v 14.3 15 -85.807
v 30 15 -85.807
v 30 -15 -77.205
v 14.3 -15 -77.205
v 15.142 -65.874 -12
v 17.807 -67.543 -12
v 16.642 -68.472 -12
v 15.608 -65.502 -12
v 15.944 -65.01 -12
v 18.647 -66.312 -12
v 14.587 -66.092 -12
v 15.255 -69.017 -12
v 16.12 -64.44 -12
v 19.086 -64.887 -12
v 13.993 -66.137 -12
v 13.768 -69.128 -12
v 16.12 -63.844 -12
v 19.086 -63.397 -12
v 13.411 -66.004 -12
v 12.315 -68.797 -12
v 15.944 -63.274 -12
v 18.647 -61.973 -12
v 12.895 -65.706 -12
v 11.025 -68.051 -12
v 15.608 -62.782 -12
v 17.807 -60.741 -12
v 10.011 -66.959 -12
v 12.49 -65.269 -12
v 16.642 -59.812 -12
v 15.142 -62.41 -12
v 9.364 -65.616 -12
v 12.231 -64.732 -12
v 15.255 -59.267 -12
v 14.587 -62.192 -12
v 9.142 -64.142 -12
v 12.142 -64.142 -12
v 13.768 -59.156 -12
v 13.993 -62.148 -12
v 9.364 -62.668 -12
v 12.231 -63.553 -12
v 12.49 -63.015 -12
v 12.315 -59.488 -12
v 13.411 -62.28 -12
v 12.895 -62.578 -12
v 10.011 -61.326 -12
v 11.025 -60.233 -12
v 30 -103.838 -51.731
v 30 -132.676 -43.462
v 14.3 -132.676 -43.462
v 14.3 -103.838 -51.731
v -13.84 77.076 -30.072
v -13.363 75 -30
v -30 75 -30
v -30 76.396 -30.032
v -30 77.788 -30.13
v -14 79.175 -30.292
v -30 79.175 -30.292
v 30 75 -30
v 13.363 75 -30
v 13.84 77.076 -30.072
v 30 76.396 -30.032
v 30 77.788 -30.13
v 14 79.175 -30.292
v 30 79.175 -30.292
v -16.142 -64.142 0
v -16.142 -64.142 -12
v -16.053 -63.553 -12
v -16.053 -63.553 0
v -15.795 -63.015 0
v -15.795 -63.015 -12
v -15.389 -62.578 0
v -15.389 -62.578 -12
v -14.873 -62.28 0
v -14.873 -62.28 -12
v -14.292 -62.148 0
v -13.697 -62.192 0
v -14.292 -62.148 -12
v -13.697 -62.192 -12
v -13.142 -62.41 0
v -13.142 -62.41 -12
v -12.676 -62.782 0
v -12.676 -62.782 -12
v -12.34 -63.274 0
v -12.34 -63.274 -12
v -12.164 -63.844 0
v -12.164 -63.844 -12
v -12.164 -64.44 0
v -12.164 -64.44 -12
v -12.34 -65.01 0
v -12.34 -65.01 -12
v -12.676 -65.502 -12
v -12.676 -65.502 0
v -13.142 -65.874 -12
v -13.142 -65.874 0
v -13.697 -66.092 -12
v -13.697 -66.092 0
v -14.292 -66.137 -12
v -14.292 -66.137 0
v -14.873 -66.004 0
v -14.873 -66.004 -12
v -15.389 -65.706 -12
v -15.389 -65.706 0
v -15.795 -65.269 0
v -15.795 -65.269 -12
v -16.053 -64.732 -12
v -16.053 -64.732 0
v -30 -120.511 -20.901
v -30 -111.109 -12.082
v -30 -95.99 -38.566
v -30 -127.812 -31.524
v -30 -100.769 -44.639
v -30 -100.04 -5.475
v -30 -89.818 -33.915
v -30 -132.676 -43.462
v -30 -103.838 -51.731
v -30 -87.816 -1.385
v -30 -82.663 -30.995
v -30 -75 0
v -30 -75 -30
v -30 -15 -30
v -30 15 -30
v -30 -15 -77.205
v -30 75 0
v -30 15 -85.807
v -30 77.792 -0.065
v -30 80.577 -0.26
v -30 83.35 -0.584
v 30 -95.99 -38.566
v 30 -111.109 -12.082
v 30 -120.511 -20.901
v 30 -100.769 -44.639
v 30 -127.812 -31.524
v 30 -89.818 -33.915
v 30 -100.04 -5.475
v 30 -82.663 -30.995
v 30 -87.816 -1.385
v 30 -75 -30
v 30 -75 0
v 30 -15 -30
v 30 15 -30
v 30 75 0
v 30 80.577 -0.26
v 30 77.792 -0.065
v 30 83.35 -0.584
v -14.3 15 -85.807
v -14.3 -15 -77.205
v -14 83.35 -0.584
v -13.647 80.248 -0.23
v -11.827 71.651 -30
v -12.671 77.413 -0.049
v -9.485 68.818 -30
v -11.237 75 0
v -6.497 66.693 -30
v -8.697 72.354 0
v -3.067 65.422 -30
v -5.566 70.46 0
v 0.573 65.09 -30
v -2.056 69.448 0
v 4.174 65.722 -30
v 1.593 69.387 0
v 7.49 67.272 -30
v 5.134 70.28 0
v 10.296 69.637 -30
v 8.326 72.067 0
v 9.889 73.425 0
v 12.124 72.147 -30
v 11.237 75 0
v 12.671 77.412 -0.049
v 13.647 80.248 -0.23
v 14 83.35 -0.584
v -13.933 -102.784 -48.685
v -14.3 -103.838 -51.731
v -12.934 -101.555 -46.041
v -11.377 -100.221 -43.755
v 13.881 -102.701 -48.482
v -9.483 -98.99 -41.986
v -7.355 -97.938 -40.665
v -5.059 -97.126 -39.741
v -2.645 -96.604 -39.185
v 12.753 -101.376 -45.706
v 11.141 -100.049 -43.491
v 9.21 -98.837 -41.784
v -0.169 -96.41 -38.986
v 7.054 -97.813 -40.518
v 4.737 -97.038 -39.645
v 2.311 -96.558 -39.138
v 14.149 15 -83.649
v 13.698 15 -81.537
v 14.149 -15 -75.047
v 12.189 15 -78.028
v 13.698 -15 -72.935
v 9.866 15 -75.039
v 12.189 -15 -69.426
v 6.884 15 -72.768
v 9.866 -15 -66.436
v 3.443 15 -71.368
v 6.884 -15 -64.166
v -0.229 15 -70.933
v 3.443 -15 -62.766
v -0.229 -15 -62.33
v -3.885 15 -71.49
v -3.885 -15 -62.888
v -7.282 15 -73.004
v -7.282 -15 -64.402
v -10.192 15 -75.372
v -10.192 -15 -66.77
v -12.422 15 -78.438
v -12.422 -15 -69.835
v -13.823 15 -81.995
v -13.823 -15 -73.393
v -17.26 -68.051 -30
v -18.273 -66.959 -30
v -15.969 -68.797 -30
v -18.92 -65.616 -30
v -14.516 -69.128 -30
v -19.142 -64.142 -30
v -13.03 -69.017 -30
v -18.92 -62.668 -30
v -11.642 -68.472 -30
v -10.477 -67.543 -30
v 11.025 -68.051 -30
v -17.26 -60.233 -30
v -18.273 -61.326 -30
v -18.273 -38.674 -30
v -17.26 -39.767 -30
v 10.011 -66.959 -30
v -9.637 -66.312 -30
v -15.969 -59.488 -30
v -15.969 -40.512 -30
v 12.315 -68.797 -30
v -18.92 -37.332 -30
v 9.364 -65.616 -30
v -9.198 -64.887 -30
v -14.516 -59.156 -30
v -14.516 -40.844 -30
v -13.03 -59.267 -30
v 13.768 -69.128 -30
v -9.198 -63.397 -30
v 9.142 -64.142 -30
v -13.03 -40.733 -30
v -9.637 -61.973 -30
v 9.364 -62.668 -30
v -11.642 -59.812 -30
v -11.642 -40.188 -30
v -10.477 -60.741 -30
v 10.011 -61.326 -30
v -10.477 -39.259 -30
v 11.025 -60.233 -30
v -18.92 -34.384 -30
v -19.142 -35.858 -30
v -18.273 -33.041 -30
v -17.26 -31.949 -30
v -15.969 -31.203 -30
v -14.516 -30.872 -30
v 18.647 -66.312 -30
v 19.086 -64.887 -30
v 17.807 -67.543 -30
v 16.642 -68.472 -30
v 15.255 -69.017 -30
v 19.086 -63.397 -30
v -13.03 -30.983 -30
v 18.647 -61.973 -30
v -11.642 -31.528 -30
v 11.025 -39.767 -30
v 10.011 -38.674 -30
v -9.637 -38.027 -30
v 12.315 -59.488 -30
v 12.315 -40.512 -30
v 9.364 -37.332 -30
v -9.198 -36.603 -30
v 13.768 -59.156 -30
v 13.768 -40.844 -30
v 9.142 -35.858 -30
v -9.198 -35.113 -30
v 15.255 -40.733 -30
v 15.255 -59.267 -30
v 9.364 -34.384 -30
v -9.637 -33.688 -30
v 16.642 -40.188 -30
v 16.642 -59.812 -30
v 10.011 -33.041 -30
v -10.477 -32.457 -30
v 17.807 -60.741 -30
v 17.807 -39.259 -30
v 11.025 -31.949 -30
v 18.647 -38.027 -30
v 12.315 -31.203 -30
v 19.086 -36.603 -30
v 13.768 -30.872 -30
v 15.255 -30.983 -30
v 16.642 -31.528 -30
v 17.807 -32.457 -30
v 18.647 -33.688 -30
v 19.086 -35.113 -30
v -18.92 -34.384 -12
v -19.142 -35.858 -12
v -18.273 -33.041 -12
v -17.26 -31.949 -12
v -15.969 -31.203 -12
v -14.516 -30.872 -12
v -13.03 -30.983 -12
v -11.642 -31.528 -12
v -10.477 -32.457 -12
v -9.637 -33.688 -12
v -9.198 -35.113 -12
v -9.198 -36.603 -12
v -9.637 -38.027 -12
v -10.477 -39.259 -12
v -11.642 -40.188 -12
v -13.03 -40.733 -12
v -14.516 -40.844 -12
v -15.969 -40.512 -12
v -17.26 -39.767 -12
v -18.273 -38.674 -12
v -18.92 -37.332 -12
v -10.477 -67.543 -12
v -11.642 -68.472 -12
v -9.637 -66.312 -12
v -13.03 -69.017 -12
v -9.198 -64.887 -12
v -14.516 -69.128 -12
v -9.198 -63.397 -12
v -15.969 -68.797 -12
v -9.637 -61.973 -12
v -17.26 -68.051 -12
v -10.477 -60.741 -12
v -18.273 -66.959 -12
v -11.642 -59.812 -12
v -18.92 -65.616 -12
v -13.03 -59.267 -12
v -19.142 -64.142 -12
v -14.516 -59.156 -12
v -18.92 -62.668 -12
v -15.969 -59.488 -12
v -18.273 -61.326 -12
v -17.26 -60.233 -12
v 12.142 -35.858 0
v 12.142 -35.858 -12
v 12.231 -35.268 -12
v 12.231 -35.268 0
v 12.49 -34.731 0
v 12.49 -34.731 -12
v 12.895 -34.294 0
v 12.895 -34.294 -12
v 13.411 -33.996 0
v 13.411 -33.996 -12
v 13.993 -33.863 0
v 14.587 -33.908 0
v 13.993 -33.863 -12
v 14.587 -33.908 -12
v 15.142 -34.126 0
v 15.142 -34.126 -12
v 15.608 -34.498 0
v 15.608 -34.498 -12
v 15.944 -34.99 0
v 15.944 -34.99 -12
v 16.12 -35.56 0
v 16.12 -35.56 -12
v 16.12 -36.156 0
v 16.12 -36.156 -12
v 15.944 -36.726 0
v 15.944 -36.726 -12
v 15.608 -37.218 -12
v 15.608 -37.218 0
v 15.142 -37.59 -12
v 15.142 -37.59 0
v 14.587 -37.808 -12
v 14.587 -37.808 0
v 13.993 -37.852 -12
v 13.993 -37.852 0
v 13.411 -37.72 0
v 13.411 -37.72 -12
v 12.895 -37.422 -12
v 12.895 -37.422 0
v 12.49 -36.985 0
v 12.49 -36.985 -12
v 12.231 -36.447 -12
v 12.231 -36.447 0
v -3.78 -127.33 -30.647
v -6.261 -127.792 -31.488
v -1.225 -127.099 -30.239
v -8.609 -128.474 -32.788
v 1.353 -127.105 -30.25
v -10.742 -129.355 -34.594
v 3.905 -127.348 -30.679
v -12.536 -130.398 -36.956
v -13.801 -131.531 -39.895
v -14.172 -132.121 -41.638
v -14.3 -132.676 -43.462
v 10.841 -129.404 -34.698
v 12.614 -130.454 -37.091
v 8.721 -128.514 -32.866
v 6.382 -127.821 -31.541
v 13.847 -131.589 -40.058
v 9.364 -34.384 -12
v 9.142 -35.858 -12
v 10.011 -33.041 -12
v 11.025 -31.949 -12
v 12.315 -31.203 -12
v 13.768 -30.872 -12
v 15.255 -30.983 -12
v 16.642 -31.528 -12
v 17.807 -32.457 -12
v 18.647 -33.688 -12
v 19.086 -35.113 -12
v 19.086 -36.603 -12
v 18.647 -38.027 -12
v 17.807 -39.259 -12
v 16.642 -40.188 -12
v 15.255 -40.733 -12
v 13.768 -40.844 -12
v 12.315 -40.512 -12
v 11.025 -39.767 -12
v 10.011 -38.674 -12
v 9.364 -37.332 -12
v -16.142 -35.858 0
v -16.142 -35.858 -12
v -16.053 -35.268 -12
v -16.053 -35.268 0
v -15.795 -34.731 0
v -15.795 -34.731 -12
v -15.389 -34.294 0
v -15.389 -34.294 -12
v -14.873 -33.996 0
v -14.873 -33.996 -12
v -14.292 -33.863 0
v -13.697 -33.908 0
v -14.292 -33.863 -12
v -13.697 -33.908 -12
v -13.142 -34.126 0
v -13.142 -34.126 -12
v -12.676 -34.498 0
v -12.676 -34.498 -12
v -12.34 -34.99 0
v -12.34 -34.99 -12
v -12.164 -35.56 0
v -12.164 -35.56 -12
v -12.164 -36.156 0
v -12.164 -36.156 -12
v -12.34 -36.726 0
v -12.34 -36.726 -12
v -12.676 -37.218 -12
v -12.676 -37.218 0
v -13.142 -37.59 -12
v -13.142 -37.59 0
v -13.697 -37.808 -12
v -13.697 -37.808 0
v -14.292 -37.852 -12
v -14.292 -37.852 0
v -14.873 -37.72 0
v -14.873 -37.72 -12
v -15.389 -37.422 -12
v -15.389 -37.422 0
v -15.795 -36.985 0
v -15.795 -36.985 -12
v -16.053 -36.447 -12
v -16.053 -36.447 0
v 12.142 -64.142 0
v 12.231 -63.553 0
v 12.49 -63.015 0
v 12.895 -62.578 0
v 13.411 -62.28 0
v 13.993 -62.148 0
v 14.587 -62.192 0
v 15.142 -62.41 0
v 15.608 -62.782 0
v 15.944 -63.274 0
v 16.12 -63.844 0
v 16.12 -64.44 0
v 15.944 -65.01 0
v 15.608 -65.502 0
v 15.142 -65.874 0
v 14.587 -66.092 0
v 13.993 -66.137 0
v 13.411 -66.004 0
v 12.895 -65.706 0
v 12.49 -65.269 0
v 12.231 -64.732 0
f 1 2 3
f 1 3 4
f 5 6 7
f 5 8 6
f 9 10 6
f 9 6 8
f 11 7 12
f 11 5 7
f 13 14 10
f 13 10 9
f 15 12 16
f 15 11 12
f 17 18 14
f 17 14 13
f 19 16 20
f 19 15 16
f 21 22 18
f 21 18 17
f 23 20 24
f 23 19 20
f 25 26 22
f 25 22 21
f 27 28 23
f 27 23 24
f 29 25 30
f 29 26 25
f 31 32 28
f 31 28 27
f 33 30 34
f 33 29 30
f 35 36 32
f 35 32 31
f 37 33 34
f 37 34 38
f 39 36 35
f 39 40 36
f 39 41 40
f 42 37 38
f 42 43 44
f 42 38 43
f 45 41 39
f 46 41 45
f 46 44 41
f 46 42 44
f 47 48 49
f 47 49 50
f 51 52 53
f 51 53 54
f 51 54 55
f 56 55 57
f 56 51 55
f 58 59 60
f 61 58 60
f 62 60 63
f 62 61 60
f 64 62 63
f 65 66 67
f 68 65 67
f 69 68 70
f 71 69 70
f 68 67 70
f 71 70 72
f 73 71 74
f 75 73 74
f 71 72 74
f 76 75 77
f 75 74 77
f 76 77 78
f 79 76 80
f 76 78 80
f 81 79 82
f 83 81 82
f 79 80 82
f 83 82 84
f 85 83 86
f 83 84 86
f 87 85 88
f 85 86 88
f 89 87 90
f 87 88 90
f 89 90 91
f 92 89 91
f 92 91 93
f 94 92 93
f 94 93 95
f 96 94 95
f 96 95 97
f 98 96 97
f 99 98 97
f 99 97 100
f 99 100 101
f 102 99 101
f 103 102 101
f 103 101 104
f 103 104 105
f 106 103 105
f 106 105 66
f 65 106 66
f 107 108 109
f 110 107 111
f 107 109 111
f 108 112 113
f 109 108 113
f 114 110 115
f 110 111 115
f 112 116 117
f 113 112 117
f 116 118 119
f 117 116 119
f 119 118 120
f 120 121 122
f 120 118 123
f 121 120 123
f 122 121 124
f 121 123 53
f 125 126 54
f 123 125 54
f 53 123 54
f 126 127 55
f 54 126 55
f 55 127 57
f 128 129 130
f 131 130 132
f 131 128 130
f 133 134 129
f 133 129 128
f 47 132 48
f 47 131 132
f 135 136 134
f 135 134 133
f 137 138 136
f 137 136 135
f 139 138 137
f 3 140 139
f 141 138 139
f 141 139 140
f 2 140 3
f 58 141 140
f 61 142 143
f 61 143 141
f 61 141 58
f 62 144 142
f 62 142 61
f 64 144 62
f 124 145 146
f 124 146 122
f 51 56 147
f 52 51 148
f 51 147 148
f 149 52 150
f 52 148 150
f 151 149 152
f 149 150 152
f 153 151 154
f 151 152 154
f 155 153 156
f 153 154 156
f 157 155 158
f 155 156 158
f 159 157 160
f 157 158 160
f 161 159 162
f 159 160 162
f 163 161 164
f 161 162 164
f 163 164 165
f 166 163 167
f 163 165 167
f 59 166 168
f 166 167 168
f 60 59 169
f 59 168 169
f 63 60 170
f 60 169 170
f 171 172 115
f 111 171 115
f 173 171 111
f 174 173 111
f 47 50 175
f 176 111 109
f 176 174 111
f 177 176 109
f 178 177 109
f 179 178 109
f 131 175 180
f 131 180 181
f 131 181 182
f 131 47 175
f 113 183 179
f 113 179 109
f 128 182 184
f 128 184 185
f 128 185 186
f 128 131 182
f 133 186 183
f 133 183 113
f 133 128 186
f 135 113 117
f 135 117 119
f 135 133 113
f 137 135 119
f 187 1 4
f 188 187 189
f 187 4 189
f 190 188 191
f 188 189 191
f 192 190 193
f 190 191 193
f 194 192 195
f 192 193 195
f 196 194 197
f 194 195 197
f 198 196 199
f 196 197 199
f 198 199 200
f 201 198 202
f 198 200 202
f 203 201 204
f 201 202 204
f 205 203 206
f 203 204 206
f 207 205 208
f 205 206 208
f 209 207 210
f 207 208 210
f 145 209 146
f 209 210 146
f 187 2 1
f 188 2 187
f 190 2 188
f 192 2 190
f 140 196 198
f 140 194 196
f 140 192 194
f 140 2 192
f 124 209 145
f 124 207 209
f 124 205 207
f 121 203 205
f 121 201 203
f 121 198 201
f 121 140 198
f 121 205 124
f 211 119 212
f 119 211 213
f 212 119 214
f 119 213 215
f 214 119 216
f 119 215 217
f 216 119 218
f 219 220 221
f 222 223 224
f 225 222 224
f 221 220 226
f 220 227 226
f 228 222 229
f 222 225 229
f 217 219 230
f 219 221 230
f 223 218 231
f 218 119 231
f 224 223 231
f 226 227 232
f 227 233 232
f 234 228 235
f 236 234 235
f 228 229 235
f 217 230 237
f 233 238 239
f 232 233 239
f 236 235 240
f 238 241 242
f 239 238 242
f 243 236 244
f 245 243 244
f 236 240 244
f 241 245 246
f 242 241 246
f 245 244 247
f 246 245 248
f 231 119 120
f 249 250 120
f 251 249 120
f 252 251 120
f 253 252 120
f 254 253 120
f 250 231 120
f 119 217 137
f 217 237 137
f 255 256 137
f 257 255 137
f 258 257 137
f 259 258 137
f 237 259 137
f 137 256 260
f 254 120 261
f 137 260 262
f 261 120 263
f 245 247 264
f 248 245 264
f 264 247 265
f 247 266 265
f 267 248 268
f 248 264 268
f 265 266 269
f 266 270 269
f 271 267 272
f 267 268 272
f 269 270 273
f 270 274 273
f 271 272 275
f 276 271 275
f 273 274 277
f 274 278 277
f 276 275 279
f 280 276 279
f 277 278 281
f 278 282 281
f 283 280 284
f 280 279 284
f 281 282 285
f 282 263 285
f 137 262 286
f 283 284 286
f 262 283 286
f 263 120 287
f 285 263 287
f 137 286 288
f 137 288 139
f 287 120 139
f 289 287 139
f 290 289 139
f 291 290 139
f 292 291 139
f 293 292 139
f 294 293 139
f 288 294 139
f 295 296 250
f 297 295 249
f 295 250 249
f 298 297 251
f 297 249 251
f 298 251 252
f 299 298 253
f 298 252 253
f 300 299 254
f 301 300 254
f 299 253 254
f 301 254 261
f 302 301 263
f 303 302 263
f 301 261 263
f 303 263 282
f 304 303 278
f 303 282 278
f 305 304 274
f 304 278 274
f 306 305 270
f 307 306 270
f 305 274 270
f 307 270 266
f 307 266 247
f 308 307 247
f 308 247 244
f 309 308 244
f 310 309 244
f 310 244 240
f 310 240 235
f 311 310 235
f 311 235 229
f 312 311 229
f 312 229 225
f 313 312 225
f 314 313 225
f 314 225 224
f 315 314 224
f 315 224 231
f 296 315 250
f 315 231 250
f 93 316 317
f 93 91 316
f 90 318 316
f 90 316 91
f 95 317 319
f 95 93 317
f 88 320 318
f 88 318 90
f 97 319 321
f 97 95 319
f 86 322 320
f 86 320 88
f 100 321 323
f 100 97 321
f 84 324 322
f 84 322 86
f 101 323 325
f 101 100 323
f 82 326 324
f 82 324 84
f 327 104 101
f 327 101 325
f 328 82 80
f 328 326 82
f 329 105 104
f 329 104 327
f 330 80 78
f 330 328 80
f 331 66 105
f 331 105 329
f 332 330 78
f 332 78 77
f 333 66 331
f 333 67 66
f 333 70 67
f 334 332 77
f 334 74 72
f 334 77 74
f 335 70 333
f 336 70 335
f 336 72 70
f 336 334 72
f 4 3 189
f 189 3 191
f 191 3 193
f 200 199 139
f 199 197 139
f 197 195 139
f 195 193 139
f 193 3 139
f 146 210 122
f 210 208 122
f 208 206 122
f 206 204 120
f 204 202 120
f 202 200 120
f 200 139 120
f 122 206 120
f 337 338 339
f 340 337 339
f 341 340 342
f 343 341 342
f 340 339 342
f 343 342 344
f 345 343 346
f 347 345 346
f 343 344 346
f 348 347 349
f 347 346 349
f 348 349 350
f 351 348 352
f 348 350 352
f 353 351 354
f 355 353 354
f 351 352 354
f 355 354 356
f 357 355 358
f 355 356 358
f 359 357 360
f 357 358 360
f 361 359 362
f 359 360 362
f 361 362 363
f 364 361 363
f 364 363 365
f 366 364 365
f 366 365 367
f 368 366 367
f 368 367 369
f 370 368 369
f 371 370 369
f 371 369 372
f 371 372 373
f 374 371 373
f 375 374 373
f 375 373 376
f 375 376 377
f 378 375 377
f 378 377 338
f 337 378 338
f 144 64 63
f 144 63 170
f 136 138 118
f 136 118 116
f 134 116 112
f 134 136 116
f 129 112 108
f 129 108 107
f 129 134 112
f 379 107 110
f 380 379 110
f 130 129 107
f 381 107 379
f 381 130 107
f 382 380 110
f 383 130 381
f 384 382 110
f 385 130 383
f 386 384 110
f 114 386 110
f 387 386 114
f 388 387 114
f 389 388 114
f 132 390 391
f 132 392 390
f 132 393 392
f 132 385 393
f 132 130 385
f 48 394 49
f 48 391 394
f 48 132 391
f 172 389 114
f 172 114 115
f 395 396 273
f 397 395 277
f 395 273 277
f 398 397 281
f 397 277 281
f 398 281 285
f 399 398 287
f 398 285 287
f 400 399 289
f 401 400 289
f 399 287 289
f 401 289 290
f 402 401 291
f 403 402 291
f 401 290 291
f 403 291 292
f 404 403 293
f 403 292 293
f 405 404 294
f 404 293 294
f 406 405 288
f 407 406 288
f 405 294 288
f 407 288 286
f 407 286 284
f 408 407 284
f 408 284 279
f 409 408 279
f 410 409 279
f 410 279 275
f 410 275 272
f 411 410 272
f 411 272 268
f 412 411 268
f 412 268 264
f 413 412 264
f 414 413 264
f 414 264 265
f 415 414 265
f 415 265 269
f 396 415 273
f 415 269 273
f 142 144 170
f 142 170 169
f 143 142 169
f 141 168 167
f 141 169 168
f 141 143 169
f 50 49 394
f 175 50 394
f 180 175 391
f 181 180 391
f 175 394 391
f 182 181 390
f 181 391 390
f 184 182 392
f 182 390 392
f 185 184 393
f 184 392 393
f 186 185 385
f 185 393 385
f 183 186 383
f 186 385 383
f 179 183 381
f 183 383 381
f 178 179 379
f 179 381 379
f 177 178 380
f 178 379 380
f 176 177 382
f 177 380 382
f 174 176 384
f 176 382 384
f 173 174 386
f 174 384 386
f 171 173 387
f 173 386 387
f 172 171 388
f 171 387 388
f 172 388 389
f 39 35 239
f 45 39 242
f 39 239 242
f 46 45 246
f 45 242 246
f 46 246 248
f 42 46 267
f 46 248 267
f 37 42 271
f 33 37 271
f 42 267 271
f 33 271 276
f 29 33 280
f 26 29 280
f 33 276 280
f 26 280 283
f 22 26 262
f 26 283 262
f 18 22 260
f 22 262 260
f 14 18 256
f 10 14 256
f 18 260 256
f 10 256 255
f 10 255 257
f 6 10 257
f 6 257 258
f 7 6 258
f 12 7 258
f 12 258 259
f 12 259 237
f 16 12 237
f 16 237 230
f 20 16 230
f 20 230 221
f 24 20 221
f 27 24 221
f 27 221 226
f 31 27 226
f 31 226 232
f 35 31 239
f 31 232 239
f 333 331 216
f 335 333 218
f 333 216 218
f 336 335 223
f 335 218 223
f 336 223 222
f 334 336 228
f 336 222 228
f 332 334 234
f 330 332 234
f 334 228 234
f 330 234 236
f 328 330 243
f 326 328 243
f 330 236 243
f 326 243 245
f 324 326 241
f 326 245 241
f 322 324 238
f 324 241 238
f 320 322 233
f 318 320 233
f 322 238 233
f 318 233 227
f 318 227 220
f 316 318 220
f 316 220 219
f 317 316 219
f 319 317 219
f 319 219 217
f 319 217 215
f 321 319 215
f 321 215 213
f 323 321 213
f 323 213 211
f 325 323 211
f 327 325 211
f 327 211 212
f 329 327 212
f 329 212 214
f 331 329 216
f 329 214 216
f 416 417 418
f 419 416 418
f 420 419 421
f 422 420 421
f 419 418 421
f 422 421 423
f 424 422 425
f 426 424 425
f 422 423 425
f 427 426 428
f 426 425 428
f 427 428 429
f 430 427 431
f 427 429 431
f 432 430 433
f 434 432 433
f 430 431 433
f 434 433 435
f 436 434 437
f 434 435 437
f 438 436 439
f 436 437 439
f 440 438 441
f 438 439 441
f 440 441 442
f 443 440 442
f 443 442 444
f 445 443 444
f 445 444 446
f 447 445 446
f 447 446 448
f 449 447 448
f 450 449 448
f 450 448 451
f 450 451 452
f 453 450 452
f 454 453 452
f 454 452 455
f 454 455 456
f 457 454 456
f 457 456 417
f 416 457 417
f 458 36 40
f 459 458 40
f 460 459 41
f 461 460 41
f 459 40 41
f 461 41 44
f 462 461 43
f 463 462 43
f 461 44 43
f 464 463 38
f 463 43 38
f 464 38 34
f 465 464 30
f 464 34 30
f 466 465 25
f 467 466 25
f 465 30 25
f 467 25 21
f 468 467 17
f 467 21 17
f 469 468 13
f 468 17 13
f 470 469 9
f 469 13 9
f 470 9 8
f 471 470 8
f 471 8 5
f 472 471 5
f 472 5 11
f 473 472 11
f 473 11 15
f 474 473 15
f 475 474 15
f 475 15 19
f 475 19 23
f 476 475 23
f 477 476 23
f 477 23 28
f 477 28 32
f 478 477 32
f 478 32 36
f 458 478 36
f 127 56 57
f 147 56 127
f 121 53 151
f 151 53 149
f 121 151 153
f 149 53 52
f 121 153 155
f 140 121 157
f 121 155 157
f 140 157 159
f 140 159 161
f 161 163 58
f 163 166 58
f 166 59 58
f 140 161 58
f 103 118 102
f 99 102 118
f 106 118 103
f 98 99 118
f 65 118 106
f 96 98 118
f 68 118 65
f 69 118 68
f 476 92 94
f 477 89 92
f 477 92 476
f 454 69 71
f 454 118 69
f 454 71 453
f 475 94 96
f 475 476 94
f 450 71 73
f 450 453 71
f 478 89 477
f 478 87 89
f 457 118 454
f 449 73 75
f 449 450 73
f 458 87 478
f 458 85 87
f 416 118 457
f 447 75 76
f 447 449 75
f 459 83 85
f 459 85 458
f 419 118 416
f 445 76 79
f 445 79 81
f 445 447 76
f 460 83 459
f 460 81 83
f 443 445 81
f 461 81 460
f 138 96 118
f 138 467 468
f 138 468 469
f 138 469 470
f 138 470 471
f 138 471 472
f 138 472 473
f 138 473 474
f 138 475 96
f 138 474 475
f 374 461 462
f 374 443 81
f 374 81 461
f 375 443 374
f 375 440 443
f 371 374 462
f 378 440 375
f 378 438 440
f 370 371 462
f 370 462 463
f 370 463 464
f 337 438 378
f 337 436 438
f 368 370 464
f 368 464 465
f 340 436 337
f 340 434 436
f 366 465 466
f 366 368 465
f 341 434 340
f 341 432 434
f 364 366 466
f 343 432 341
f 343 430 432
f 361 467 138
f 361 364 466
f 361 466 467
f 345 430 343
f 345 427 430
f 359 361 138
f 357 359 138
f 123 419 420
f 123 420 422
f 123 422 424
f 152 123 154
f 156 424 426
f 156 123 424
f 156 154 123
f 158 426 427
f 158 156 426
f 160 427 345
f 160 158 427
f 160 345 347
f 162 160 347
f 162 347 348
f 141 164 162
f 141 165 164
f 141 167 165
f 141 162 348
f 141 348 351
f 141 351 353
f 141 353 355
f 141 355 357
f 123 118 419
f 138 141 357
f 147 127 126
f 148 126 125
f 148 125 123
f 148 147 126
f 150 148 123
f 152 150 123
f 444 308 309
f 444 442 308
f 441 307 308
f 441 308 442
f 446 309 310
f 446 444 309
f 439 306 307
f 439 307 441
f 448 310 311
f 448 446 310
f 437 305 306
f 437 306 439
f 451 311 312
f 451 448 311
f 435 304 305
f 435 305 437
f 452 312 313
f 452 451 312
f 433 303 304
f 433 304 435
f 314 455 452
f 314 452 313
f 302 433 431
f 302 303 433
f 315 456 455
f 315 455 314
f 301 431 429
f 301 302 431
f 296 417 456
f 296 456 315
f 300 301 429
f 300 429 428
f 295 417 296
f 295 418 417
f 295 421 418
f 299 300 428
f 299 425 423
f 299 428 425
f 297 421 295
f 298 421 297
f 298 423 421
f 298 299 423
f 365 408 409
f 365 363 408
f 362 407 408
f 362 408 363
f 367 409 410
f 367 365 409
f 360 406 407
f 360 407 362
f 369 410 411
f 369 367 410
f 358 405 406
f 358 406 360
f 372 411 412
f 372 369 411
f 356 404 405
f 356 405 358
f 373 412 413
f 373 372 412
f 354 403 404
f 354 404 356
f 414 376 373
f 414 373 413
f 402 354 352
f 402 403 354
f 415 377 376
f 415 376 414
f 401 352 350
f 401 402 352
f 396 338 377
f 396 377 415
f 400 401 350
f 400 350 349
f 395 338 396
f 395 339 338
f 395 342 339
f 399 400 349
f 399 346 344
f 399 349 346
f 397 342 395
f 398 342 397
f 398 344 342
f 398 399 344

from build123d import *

# Parameters (mm, degrees)
SKETCH_1_W          = 60
SKETCH_1_H          = 150
EXTRUDE_1_DEPTH     = 30
SKETCH_2_R          = 5
CUT_EXTRUDE_1_DEPTH = 18
SKETCH_6_R          = 2
CUT_EXTRUDE_2_DEPTH = 83.758685345
EXTRUDE_2_DEPTH     = 60
SKETCH_8_W          = 60
SKETCH_8_H          = 30
EXTRUDE_3_DEPTH     = 60
SKETCH_9_W          = 139.095899212
SKETCH_9_H          = 109.690247042
CUT_EXTRUDE_3_DEPTH = 138.516765531
CUT_EXTRUDE_4_DEPTH = 221.495173564
EXTRUDE_4_DEPTH     = 30
CUT_EXTRUDE_5_DEPTH = 240.854663136


with BuildPart() as part:
    # 草图1 → 凸台-拉伸1 (new body)
    with BuildSketch(Plane.XY):
        Rectangle(SKETCH_1_W, SKETCH_1_H)
    extrude(amount=-EXTRUDE_1_DEPTH)

    # 草图2 → 切除-拉伸1 (cut)
    with BuildSketch(Plane(origin=(0, 0, -30), x_dir=(-1, 0, 0), z_dir=(0, 0, -1))):
        with Locations((-14.142135624, -35.857864376)):
            Circle(SKETCH_2_R)
        with Locations((14.142135624, -35.857864376)):
            Circle(SKETCH_2_R)
        with Locations((14.142135624, -64.142135624)):
            Circle(SKETCH_2_R)
        with Locations((-14.142135624, -64.142135624)):
            Circle(SKETCH_2_R)
    extrude(amount=-CUT_EXTRUDE_1_DEPTH, mode=Mode.SUBTRACT)

    # 草图6 → 切除-拉伸2 (cut, through all)
    with BuildSketch(Plane(origin=(0, 0, -12), x_dir=(-1, 0, 0), z_dir=(0, 0, -1))):
        with Locations((14.142135624, -64.142135624)):
            Circle(SKETCH_6_R)
        with Locations((-14.142135624, -64.142135624)):
            Circle(SKETCH_6_R)
        with Locations((-14.142135624, -35.857864376)):
            Circle(SKETCH_6_R)
        with Locations((14.142135624, -35.857864376)):
            Circle(SKETCH_6_R)
    extrude(amount=-CUT_EXTRUDE_2_DEPTH, mode=Mode.SUBTRACT)

    # 草图7 → 凸台-拉伸2 (add)
    with BuildSketch(Plane(origin=(30, 0, 0), x_dir=(0, 0, -1), z_dir=(1, 0, 0))):
        with BuildLine():
            Line((43.461758651, -132.675701756), (51.730879325, -103.837850878))
            ThreePointArc((51.730879325, -103.837850878), (36.040934699, -93.054450695), (30, -75))
            Line((30, -75), (0, -75))
            ThreePointArc((0, -75), (12.081869397, -111.108901389), (43.461758651, -132.675701756))
        make_face()
    extrude(amount=-EXTRUDE_2_DEPTH)

    # 草图8 → 凸台-拉伸3 (add)
    with BuildSketch(Plane(origin=(0, 0, -30), x_dir=(-1, 0, 0), z_dir=(0, 0, -1))):
        Rectangle(SKETCH_8_W, SKETCH_8_H)
    extrude(amount=EXTRUDE_3_DEPTH)

    # 草图9 → 切除-拉伸3 (cut, through all)
    with BuildSketch(Plane(origin=(0, -21.595774321, -75.313415293), x_dir=(-1, 0, 0), z_dir=(0, -0.27563735581699267, -0.9612616959383208))):
        Rectangle(SKETCH_9_W, SKETCH_9_H)
    extrude(amount=CUT_EXTRUDE_3_DEPTH, mode=Mode.SUBTRACT)

    # 草图10 → 切除-拉伸4 (cut, through all)
    with BuildSketch(Plane(origin=(30, -132.675701756, -43.461758651), x_dir=(-1, 0, 0), z_dir=(0, -0.9612616959383208, 0.27563735581699267))):
        with BuildLine():
            ThreePointArc((15.7, 0), (30, -14.3), (44.3, 0))
            Line((44.3, 0), (15.7, 0))
        make_face()
        with BuildLine():
            Line((15.7, 0), (44.3, 0))
            ThreePointArc((44.3, 0), (30, 14.3), (15.7, 0))
        make_face()
    extrude(amount=-CUT_EXTRUDE_4_DEPTH, mode=Mode.SUBTRACT)

    # 草图11 → 凸台-拉伸4 (add, symmetric)
    with BuildSketch(Plane(origin=(0, 0, 0), x_dir=(0, 0, -1), z_dir=(1, 0, 0))):
        with BuildLine():
            ThreePointArc((30, 75), (30.073078492, 77.092694212), (30.291957938, 79.175193029))
            Line((30.291957938, 79.175193029), (0.583915876, 83.350386058))
            ThreePointArc((0.583915876, 83.350386058), (0.146156984, 79.185388425), (0, 75))
            Line((0, 75), (30, 75))
        make_face()
    extrude(amount=EXTRUDE_4_DEPTH, both=True)

    # 草图12 → 切除-拉伸5 (cut, through all)
    with BuildSketch(Plane(origin=(30, 83.350386058, -0.583915876), x_dir=(1, 0, 0), z_dir=(0, 0.1391731009600656, 0.9902680687415703))):
        with BuildLine():
            ThreePointArc((-16, 0), (-30, 14), (-44, 0))
            Line((-44, 0), (-16, 0))
        make_face()
        with BuildLine():
            Line((-16, 0), (-44, 0))
            ThreePointArc((-44, 0), (-30, -14), (-16, 0))
        make_face()
    extrude(amount=-CUT_EXTRUDE_5_DEPTH, mode=Mode.SUBTRACT)


solid = part.part
